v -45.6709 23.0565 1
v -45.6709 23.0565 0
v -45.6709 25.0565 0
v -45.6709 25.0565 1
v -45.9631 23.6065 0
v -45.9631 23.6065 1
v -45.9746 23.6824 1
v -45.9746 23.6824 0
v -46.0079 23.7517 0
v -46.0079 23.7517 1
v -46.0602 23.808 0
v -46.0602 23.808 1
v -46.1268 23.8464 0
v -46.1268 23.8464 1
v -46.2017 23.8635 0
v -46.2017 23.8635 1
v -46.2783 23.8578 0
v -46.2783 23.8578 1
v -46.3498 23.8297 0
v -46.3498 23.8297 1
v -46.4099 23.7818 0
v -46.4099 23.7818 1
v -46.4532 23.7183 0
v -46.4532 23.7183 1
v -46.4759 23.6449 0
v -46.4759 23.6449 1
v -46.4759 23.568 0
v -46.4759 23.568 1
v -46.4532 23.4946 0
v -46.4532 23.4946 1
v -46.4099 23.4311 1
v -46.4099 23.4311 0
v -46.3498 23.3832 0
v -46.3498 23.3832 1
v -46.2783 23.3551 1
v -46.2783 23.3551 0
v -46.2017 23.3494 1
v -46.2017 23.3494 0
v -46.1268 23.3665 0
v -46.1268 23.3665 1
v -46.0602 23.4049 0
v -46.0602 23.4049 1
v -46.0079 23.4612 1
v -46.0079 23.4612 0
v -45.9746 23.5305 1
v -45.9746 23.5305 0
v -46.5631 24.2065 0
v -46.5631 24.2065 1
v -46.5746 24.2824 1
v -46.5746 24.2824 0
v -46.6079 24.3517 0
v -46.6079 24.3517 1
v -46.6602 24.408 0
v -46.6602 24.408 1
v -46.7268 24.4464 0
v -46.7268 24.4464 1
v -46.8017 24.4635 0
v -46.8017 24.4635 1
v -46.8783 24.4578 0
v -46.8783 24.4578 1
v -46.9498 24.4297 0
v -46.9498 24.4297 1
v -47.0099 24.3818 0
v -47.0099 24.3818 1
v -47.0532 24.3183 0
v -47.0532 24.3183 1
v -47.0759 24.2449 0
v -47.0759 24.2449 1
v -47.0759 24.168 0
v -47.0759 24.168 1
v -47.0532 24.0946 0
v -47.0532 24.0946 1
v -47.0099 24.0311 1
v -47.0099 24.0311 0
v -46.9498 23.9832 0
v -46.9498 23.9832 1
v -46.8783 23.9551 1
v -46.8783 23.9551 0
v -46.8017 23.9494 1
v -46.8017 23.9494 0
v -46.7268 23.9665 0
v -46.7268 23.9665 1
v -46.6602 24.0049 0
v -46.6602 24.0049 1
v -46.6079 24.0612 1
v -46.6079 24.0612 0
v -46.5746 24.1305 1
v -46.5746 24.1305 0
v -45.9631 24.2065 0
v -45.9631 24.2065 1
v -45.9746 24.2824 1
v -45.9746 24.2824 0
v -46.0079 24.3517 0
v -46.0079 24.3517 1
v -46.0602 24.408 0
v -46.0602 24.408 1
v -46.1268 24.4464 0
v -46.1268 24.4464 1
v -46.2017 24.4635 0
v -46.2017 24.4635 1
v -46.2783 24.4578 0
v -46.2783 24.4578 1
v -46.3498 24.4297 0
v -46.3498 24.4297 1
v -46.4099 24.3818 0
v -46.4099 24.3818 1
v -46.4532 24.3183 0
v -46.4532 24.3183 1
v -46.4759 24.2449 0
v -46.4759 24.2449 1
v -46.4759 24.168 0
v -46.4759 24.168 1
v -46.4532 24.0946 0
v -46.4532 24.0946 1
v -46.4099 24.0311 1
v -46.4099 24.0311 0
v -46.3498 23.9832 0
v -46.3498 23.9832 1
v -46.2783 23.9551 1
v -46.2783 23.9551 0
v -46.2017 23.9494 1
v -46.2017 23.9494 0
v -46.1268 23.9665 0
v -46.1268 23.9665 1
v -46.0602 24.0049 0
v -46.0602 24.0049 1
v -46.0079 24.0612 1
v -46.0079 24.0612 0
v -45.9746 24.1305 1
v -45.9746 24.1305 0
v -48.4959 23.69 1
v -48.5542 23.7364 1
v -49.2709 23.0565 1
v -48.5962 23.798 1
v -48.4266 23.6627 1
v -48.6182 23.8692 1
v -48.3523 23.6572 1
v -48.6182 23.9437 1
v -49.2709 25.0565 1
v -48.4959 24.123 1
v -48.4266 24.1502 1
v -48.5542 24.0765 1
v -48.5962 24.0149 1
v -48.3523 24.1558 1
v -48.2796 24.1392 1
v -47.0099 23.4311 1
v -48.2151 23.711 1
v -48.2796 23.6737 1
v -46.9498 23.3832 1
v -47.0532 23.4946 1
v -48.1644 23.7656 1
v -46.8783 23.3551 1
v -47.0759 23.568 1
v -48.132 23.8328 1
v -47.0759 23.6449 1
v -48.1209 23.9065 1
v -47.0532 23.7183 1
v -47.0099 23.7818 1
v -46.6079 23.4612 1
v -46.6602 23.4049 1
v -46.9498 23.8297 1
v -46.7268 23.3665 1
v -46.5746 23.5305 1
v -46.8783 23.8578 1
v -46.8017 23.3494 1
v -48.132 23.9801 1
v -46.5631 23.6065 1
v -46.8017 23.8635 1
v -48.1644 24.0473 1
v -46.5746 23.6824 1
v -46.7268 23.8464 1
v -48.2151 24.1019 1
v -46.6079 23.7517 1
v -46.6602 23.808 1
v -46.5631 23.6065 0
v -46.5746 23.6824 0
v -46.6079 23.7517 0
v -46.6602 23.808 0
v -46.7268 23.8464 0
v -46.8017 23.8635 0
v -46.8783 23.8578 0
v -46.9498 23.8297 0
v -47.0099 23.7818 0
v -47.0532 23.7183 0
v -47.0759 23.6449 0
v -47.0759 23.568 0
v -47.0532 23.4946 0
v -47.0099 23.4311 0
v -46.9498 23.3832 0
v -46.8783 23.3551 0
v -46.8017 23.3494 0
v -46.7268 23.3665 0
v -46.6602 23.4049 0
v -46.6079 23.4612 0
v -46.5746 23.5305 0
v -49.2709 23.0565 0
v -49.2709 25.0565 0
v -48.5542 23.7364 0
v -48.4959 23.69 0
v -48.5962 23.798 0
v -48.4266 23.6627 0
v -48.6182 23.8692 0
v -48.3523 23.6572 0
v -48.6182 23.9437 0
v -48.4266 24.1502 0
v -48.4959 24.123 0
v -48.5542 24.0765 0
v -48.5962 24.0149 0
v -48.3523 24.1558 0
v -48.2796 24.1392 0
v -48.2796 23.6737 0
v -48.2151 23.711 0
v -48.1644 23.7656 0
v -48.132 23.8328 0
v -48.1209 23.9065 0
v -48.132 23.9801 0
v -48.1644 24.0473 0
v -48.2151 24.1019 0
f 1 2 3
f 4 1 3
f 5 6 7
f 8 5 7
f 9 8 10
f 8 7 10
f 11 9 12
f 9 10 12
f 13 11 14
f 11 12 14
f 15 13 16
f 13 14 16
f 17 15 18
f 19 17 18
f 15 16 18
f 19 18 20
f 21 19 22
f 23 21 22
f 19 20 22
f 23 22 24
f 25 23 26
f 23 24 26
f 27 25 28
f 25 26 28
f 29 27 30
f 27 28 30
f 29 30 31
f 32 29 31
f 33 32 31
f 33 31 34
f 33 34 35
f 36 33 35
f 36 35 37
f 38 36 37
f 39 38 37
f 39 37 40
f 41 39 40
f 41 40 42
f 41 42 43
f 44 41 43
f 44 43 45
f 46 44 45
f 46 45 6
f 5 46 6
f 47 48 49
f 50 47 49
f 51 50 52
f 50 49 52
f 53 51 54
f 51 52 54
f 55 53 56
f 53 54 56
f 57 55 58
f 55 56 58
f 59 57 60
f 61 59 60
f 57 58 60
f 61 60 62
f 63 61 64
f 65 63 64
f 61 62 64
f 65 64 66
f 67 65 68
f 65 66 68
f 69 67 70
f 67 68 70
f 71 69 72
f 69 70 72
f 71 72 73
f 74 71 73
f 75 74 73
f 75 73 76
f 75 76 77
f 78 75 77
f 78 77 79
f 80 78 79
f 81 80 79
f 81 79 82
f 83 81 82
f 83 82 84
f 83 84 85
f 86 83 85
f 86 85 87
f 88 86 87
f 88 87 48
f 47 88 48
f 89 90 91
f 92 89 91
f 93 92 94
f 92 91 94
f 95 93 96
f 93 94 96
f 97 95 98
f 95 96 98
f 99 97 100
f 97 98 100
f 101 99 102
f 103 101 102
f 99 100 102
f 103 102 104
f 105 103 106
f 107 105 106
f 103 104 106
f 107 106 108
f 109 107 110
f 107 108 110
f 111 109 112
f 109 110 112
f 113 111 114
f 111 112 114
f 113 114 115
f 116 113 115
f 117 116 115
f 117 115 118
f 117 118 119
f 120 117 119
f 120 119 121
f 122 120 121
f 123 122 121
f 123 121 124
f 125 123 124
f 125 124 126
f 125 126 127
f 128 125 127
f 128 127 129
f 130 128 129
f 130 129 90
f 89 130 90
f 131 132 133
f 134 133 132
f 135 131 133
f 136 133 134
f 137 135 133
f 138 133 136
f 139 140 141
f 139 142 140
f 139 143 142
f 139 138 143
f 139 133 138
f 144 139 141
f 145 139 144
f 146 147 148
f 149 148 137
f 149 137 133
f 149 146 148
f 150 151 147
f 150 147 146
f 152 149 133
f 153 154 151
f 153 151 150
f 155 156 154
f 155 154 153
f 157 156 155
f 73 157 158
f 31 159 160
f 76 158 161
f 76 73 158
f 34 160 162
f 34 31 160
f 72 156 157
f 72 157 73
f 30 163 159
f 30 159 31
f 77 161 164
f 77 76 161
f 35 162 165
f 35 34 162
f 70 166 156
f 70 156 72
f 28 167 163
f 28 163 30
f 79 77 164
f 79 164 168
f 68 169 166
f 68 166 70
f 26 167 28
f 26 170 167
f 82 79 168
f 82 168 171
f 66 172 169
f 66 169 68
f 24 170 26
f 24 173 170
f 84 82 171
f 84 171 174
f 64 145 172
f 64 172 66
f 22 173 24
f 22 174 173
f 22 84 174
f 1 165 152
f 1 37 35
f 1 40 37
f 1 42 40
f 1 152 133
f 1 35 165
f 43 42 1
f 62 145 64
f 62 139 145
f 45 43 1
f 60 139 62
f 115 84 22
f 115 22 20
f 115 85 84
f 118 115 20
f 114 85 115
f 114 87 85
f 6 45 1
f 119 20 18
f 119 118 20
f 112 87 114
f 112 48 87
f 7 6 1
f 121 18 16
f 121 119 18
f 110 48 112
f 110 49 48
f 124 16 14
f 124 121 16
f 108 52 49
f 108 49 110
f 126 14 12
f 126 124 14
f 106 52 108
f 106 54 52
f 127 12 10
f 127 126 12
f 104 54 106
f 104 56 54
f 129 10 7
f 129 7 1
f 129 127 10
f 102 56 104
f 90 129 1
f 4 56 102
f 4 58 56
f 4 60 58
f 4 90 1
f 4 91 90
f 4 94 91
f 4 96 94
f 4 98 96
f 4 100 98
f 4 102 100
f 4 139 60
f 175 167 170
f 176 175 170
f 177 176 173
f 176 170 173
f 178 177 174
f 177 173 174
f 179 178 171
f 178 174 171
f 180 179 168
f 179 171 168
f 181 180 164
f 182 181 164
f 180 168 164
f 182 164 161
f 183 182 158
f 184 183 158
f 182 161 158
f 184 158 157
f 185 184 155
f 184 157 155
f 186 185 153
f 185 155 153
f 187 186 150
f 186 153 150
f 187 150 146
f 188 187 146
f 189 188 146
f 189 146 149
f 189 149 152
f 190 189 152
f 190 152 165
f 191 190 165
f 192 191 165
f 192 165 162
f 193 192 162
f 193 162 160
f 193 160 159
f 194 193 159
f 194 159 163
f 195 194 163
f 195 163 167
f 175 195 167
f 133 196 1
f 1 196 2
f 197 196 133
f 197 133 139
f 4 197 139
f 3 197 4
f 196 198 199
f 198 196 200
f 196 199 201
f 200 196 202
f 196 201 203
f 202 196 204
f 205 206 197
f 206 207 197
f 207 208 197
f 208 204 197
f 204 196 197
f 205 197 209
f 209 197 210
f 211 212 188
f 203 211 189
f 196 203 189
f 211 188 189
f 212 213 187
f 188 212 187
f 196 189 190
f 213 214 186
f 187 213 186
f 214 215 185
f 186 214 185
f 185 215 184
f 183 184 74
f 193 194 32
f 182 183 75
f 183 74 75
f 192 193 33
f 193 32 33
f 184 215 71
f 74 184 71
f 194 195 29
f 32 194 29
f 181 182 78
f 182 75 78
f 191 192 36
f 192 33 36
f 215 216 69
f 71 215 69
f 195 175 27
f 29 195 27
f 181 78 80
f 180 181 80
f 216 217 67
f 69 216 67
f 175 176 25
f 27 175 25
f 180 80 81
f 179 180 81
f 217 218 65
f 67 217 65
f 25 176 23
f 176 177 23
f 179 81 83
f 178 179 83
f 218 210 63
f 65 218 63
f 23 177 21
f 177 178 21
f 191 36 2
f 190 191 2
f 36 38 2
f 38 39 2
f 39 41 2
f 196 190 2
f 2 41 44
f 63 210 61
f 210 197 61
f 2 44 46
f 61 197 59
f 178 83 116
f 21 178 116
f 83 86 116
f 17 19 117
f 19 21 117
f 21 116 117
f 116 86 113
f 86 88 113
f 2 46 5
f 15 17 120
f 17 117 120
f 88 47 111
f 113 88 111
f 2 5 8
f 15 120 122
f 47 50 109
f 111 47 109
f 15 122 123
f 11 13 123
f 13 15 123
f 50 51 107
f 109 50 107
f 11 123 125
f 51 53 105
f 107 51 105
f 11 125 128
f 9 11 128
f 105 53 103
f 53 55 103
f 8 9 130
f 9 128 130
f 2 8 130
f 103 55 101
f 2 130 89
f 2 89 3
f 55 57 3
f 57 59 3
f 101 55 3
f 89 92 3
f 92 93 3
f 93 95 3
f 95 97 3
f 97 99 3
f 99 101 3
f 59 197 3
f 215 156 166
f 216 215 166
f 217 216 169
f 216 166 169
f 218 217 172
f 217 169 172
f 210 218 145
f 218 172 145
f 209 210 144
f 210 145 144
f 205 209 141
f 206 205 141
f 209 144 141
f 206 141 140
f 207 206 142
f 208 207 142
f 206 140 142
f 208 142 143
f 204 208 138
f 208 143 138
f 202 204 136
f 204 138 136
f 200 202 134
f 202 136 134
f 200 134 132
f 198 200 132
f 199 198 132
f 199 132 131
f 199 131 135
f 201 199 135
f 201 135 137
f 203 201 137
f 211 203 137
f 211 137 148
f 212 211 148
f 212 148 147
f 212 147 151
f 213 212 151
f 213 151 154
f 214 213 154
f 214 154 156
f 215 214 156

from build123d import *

# Parameters (mm, degrees)
SKETCH1_W          = 3.6
SKETCH1_H          = 2
EXTRUDE1_DEPTH     = 1
SKETCH2_R          = 0.25
CUT_EXTRUDE1_DEPTH = 2
SKETCH3_R          = 0.25781
CUT_EXTRUDE2_DEPTH = 2


with BuildPart() as part:
    # Sketch1 → Extrude1 (new body)
    with BuildSketch(Plane.XY):
        with Locations((-47.470942408, 24.056457243)):
            Rectangle(SKETCH1_W, SKETCH1_H)
    extrude(amount=EXTRUDE1_DEPTH)

    # Sketch2 → Cut-Extrude1 (cut, through all)
    with BuildSketch(Plane.XY.offset(1)):
        with Locations((-48.370942408, 23.906457243)):
            Circle(SKETCH2_R)
    extrude(amount=-CUT_EXTRUDE1_DEPTH, mode=Mode.SUBTRACT)

    # Sketch3 → Cut-Extrude2 (cut, through all)
    with BuildSketch(Plane.XY.offset(1)):
        with Locations((-46.820942408, 24.206457243)):
            Circle(SKETCH3_R)
        with Locations((-46.820942408, 23.606457243)):
            Circle(SKETCH3_R)
        with Locations((-46.220942408, 23.606457243)):
            Circle(SKETCH3_R)
        with Locations((-46.220942408, 24.206457243)):
            Circle(SKETCH3_R)
    extrude(amount=-CUT_EXTRUDE2_DEPTH, mode=Mode.SUBTRACT)


solid = part.part
